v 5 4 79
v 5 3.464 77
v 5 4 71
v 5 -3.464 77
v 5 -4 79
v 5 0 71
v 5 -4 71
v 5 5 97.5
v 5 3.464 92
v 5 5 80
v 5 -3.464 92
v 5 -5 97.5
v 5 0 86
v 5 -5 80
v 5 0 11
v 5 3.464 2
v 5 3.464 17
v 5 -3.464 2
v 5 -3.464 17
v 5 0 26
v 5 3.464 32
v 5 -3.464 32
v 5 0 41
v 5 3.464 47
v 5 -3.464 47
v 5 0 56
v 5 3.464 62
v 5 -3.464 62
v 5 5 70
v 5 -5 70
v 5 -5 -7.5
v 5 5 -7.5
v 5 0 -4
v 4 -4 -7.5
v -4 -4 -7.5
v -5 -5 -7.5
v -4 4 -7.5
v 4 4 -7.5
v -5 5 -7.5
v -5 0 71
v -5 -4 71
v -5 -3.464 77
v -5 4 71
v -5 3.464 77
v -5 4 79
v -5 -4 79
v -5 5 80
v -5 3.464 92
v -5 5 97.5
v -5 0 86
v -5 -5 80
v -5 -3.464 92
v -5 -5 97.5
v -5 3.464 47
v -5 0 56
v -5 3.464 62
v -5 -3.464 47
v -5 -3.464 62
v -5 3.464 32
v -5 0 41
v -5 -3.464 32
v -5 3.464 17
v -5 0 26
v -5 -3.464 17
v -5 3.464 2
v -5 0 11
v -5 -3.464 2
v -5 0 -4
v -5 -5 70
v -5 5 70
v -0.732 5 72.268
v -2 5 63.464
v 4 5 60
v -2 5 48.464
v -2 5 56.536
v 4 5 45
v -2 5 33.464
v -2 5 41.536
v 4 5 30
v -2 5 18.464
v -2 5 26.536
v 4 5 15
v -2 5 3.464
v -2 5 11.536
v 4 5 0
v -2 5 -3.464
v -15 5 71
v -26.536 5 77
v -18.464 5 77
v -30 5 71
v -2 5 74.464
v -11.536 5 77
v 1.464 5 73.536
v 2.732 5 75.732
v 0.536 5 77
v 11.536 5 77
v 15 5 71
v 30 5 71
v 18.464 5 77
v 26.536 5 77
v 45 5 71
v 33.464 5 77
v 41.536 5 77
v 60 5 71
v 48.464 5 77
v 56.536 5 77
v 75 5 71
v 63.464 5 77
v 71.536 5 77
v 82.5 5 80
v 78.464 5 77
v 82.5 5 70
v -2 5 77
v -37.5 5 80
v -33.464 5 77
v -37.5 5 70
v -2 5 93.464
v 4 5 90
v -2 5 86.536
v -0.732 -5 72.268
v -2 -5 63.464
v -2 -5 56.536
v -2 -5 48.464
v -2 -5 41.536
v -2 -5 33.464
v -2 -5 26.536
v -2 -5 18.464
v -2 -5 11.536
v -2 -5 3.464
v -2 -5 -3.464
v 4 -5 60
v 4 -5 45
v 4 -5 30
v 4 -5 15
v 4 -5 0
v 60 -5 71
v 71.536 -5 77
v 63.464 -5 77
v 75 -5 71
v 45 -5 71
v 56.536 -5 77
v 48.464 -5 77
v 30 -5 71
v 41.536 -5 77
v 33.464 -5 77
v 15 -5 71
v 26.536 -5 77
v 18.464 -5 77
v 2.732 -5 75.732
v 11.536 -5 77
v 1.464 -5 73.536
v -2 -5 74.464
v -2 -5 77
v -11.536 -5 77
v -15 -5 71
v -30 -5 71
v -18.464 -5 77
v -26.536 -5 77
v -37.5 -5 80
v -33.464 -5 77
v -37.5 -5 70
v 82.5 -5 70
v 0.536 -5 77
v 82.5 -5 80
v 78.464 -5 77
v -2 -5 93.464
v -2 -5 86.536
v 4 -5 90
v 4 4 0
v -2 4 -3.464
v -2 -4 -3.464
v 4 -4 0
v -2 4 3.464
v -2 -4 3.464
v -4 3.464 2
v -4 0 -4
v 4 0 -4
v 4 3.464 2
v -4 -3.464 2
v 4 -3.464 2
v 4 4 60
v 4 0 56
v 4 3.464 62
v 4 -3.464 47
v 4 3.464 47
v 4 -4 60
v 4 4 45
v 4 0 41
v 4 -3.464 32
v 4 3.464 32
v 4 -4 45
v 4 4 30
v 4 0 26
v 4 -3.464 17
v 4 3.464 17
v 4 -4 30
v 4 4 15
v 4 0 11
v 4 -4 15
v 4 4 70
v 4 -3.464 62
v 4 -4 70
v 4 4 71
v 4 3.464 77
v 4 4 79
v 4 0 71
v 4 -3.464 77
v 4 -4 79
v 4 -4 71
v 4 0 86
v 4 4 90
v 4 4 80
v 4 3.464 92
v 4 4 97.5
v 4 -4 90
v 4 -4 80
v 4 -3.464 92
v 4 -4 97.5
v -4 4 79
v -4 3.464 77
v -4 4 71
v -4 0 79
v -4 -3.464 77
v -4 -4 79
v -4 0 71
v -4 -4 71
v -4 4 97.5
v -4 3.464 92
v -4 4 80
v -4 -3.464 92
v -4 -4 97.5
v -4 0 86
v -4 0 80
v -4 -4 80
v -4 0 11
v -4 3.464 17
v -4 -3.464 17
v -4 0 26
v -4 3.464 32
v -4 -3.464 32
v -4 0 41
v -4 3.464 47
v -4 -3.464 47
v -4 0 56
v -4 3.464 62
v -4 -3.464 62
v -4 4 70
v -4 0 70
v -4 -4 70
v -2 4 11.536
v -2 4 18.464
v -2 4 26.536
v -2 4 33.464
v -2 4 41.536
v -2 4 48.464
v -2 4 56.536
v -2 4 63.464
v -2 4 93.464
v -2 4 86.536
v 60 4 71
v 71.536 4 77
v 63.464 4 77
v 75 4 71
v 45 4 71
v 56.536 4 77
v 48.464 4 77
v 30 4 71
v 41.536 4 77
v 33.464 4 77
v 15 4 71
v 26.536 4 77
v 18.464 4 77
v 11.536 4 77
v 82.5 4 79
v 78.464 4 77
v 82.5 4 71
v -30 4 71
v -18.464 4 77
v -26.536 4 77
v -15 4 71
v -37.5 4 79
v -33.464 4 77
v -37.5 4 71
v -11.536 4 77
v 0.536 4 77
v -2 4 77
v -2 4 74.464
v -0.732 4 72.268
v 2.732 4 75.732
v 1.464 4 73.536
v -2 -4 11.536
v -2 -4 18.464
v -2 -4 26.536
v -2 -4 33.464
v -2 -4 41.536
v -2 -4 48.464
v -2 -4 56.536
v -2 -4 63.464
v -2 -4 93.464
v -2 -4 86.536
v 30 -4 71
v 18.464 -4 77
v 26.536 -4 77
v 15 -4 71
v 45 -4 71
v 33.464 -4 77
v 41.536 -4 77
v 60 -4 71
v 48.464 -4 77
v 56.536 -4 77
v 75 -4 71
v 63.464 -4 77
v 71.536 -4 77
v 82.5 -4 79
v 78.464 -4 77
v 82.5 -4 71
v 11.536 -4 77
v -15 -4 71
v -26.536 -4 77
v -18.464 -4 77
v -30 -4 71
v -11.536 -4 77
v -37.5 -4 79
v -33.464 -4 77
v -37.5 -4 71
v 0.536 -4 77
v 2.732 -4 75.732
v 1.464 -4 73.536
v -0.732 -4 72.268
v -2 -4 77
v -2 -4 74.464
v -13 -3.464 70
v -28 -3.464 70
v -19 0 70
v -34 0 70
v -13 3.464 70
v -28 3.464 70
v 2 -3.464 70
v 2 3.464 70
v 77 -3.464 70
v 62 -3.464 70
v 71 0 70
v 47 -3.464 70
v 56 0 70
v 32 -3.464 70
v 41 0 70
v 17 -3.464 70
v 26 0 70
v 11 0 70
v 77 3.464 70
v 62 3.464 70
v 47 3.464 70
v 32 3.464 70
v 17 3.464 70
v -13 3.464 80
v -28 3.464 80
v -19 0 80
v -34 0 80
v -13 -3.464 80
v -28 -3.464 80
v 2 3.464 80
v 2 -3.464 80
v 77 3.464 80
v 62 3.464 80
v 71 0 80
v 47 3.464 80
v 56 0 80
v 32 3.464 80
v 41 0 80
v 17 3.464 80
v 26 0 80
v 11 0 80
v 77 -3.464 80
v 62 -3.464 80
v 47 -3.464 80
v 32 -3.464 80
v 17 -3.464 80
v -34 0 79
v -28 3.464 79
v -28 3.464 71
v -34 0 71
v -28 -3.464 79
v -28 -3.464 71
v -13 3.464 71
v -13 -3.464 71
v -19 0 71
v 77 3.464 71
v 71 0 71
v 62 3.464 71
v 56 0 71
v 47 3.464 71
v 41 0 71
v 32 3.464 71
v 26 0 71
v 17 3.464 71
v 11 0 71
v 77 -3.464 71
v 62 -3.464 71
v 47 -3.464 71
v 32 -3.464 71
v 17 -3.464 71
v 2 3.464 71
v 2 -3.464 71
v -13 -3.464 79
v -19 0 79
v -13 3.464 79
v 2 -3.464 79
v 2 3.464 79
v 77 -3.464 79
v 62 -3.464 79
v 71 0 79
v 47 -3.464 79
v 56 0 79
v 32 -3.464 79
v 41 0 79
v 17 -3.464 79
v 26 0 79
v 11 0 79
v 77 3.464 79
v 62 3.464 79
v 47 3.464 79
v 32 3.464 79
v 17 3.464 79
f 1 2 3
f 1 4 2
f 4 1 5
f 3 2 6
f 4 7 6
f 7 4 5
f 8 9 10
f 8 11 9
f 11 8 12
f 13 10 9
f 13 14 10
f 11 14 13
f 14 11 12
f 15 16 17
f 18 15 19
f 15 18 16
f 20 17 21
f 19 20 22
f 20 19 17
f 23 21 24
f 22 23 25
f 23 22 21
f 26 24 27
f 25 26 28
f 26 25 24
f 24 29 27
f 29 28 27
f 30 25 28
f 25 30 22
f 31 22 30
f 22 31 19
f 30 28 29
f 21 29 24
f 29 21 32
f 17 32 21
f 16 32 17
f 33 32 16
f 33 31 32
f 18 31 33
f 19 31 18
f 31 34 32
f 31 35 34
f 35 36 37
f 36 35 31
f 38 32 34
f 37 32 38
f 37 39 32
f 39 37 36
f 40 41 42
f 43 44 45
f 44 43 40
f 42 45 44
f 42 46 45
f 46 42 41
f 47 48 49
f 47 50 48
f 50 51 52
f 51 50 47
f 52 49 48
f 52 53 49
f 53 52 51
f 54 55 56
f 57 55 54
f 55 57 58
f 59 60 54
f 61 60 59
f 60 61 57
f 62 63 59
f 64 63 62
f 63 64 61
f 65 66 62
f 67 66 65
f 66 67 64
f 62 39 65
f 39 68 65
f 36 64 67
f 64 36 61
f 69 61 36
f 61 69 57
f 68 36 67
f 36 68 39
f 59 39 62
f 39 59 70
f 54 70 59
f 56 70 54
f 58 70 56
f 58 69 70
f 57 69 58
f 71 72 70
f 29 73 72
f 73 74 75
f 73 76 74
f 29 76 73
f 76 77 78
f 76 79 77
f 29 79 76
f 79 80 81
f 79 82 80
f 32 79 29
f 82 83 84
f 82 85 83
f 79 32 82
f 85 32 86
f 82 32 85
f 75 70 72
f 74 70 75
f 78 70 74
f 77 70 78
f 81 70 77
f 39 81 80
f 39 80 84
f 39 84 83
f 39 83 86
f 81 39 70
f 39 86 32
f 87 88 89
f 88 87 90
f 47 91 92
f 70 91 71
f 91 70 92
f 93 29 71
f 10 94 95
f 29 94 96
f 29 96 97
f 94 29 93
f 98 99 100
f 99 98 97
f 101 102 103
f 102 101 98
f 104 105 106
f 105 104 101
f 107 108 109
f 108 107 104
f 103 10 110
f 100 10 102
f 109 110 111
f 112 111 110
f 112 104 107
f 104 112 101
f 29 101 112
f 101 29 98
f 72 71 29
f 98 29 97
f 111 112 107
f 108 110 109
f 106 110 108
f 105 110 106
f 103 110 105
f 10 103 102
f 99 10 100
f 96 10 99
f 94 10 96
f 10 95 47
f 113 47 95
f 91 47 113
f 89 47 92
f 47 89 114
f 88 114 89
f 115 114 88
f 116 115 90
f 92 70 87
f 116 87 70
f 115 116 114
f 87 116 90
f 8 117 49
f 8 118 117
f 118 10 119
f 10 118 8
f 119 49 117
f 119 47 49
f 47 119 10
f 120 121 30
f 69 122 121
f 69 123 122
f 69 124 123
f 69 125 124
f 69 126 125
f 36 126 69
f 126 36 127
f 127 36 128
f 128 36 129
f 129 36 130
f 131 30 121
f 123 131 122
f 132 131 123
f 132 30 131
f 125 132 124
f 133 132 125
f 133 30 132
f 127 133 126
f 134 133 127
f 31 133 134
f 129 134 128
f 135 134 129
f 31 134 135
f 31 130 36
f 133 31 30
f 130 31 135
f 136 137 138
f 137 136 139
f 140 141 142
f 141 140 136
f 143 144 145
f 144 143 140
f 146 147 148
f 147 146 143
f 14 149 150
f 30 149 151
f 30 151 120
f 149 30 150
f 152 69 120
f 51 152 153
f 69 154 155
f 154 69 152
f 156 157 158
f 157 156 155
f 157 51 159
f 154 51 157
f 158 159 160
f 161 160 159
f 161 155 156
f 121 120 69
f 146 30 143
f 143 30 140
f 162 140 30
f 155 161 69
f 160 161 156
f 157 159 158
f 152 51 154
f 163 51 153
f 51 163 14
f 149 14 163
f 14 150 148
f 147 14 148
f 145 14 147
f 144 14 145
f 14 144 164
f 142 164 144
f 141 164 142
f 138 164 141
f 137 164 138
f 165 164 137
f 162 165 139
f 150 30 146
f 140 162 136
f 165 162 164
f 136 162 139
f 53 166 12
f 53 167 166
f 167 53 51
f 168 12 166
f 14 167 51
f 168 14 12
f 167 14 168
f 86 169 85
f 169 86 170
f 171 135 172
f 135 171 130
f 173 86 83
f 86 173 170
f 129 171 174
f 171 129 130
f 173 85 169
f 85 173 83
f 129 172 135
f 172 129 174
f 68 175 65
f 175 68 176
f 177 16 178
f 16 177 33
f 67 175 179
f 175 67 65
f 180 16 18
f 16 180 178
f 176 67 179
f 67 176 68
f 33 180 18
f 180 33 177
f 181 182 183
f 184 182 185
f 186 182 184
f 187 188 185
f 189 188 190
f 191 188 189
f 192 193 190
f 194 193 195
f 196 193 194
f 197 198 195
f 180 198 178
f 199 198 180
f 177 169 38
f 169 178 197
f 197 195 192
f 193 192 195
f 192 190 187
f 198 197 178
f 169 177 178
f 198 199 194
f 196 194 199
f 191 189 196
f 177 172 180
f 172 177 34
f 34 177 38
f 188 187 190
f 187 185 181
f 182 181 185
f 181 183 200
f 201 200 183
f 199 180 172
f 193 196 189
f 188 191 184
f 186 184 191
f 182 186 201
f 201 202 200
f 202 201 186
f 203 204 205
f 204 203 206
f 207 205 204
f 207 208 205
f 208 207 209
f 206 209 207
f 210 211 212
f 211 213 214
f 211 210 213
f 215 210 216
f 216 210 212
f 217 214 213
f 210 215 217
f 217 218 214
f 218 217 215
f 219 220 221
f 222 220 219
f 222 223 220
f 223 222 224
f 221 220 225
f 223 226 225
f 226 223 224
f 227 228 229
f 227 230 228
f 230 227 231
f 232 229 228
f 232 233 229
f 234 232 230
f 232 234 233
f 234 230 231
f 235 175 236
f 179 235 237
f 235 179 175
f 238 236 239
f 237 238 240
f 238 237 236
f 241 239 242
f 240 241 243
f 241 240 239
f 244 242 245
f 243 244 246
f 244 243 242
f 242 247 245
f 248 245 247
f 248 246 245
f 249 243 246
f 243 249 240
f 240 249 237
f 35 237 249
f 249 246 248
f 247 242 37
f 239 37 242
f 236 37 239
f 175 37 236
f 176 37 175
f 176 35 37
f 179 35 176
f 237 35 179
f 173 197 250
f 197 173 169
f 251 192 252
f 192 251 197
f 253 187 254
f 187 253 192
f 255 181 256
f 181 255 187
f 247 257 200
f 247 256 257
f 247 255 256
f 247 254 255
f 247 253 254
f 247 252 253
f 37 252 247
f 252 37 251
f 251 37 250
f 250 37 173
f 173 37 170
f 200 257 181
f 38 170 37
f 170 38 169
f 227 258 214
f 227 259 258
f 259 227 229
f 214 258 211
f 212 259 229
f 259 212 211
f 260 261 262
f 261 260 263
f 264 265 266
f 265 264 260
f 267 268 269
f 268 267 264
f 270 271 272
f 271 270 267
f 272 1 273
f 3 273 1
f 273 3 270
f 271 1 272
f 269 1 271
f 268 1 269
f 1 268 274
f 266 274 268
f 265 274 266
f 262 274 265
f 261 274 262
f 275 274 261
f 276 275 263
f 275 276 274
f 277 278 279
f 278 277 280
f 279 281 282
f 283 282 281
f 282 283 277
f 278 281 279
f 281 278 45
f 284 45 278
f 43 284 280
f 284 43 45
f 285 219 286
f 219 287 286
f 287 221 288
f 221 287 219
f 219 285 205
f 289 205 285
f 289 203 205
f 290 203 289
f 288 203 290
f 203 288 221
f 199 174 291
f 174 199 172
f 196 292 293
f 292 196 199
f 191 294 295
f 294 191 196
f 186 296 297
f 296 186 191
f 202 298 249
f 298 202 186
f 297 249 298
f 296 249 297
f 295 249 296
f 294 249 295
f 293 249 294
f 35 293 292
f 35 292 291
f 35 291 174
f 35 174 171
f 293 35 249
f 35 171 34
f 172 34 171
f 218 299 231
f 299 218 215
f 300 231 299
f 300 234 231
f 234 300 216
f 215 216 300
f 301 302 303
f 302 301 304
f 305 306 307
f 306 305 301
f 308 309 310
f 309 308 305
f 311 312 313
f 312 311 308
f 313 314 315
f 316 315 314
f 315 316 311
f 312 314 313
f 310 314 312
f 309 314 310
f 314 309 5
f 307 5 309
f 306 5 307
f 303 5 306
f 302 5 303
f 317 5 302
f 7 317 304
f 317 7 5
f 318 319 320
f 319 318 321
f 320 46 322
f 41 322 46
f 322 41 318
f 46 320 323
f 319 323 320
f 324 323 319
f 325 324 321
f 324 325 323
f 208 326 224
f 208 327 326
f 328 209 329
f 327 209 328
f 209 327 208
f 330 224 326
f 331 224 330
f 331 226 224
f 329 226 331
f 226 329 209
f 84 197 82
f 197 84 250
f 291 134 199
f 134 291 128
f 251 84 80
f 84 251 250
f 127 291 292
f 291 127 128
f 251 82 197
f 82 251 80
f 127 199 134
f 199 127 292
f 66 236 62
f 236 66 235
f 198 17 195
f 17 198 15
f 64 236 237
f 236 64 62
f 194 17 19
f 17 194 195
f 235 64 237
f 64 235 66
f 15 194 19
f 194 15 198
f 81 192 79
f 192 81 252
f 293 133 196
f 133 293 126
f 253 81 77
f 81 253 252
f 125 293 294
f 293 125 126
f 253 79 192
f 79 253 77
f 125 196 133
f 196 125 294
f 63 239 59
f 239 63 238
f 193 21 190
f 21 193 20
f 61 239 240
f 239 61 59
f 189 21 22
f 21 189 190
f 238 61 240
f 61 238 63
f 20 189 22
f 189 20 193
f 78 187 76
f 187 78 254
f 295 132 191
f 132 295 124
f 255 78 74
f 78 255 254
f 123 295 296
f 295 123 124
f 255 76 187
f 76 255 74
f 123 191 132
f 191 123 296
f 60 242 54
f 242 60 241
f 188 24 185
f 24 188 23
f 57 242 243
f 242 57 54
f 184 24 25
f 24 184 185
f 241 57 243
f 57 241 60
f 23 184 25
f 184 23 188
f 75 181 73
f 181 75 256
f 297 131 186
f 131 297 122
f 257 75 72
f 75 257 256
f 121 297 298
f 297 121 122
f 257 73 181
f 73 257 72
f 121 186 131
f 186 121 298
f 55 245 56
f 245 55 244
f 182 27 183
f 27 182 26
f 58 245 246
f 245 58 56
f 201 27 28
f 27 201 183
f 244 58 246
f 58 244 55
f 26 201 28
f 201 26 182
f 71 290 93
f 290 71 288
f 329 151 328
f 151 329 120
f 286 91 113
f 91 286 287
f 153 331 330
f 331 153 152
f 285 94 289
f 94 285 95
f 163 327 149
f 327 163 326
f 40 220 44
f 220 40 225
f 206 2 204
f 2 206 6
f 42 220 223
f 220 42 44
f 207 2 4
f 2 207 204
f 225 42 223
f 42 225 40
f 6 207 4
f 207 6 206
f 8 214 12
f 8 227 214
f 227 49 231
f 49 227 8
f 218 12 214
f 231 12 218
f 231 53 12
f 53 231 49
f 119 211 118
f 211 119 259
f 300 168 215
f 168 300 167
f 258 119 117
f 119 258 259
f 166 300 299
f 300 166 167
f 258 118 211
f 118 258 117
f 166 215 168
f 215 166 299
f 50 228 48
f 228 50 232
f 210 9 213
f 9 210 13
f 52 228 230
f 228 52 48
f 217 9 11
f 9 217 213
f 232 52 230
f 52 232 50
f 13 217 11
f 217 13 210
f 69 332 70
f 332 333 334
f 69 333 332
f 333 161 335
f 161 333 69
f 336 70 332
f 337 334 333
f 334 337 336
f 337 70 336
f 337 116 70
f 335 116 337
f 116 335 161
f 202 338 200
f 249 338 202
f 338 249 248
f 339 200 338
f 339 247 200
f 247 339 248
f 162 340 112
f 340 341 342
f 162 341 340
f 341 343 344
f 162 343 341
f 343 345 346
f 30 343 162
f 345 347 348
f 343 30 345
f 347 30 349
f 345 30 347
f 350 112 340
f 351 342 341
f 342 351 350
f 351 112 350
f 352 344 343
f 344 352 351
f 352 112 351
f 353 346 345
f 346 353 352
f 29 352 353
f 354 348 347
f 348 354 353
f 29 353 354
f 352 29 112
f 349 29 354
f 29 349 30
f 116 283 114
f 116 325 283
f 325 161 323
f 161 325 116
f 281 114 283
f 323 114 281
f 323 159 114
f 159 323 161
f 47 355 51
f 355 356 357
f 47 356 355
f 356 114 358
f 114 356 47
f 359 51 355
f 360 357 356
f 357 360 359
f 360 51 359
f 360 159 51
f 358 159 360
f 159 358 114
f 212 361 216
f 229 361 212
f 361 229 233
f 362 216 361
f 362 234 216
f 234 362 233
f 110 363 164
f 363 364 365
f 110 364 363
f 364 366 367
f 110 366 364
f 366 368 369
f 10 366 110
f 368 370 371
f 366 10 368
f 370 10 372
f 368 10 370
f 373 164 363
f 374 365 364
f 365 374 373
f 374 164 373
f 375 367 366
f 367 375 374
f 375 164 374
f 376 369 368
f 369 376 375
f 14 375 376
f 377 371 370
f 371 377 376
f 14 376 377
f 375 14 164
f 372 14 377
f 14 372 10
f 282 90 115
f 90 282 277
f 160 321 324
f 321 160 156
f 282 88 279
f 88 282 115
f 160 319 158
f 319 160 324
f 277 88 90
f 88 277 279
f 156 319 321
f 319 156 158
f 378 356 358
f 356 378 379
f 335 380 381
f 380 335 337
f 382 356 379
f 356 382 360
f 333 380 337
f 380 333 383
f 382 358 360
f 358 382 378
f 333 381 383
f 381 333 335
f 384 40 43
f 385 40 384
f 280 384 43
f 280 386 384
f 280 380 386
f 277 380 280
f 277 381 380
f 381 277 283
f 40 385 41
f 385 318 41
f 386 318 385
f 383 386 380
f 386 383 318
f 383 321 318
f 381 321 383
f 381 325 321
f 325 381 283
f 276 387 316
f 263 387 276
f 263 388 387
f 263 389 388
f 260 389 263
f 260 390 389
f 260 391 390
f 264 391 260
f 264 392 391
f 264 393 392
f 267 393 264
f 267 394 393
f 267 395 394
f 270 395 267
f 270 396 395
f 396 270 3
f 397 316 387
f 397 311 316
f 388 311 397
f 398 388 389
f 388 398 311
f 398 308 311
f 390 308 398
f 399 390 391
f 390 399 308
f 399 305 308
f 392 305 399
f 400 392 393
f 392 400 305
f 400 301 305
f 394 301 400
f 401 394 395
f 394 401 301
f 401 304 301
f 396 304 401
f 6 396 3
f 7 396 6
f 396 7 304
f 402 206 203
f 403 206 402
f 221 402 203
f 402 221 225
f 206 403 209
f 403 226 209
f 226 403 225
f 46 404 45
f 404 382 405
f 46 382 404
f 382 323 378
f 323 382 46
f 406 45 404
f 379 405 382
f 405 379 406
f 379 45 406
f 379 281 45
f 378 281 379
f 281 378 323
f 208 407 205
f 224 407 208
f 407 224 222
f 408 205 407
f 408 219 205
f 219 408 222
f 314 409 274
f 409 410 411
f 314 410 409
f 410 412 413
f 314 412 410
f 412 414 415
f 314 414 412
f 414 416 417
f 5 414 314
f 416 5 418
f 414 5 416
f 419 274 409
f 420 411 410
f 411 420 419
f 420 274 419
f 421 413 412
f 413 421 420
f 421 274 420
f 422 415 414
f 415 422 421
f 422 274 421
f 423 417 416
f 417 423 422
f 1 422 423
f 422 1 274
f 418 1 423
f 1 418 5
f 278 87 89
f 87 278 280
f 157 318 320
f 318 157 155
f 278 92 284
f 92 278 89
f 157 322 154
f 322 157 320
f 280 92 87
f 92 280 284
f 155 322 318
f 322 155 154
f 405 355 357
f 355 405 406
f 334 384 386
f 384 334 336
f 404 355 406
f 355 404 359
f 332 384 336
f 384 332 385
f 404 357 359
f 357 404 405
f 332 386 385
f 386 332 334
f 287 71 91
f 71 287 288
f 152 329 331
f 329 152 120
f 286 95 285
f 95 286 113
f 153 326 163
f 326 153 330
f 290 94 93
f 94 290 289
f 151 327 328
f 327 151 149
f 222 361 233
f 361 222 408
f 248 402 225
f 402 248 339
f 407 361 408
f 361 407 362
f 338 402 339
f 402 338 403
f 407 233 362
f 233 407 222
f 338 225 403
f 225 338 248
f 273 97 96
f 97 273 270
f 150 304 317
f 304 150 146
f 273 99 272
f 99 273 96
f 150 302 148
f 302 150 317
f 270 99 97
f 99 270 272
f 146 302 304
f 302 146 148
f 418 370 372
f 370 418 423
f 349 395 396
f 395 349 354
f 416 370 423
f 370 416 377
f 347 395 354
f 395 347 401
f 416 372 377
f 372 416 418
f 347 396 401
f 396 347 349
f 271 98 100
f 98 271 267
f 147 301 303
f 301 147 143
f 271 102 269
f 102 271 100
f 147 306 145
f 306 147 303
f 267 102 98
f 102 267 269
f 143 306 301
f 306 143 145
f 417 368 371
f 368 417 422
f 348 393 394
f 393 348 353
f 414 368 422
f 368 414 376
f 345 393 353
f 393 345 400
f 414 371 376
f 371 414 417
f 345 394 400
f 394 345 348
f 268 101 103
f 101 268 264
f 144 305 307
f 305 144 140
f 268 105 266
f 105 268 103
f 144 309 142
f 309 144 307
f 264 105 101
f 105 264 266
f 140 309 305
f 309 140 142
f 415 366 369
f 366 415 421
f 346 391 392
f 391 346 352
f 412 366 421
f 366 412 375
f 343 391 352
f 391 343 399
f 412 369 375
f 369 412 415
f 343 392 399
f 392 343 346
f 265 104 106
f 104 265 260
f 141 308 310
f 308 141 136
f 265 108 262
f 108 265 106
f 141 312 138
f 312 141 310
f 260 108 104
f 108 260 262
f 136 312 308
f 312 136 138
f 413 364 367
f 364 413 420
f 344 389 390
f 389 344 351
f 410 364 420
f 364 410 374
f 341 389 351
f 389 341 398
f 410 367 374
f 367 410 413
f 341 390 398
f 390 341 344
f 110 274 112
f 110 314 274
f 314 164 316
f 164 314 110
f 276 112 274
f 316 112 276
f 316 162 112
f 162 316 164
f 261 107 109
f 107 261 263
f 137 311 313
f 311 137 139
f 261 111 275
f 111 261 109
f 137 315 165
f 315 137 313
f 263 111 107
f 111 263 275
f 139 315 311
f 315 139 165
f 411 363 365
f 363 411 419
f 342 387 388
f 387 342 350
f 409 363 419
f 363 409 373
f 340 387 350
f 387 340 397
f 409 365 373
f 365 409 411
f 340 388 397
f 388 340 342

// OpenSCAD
// Filename : Crane.scad
// Version  : v1.0
// Modified : 3 Sept 2016
// Author   : Jason Yeo
//////////////////////////////////////
// Basic car frame. (Base class)
//////////////////////////////////////
crane();

module crane()
{
    mast();
    boom();
}

module boom()
{
    height=15;
    for(i=[-2:5])
        translate([i*height,0,5*height]) rotate([0,90,0])block(10,height);
}
module mast()
{
    height=15;
    for(i=[0:6])
        translate([0,0,i*height]) block(10,height);
}
  
module block(size=10, height=15)
{
    difference()
    {
        cube([size,size,height],true);
        rotate([-90,0,0]) cylinder(size+2,4,4,true,$fn =3);
        rotate([0,90,0]) cylinder(size+2,4,4,true,$fn =3);
        cube([size-2,size-2,height+2],true);
        //cube([size+2,size-2,height-2],true);
        //cube([size-2,size+2,height-2],true);
    }
}
